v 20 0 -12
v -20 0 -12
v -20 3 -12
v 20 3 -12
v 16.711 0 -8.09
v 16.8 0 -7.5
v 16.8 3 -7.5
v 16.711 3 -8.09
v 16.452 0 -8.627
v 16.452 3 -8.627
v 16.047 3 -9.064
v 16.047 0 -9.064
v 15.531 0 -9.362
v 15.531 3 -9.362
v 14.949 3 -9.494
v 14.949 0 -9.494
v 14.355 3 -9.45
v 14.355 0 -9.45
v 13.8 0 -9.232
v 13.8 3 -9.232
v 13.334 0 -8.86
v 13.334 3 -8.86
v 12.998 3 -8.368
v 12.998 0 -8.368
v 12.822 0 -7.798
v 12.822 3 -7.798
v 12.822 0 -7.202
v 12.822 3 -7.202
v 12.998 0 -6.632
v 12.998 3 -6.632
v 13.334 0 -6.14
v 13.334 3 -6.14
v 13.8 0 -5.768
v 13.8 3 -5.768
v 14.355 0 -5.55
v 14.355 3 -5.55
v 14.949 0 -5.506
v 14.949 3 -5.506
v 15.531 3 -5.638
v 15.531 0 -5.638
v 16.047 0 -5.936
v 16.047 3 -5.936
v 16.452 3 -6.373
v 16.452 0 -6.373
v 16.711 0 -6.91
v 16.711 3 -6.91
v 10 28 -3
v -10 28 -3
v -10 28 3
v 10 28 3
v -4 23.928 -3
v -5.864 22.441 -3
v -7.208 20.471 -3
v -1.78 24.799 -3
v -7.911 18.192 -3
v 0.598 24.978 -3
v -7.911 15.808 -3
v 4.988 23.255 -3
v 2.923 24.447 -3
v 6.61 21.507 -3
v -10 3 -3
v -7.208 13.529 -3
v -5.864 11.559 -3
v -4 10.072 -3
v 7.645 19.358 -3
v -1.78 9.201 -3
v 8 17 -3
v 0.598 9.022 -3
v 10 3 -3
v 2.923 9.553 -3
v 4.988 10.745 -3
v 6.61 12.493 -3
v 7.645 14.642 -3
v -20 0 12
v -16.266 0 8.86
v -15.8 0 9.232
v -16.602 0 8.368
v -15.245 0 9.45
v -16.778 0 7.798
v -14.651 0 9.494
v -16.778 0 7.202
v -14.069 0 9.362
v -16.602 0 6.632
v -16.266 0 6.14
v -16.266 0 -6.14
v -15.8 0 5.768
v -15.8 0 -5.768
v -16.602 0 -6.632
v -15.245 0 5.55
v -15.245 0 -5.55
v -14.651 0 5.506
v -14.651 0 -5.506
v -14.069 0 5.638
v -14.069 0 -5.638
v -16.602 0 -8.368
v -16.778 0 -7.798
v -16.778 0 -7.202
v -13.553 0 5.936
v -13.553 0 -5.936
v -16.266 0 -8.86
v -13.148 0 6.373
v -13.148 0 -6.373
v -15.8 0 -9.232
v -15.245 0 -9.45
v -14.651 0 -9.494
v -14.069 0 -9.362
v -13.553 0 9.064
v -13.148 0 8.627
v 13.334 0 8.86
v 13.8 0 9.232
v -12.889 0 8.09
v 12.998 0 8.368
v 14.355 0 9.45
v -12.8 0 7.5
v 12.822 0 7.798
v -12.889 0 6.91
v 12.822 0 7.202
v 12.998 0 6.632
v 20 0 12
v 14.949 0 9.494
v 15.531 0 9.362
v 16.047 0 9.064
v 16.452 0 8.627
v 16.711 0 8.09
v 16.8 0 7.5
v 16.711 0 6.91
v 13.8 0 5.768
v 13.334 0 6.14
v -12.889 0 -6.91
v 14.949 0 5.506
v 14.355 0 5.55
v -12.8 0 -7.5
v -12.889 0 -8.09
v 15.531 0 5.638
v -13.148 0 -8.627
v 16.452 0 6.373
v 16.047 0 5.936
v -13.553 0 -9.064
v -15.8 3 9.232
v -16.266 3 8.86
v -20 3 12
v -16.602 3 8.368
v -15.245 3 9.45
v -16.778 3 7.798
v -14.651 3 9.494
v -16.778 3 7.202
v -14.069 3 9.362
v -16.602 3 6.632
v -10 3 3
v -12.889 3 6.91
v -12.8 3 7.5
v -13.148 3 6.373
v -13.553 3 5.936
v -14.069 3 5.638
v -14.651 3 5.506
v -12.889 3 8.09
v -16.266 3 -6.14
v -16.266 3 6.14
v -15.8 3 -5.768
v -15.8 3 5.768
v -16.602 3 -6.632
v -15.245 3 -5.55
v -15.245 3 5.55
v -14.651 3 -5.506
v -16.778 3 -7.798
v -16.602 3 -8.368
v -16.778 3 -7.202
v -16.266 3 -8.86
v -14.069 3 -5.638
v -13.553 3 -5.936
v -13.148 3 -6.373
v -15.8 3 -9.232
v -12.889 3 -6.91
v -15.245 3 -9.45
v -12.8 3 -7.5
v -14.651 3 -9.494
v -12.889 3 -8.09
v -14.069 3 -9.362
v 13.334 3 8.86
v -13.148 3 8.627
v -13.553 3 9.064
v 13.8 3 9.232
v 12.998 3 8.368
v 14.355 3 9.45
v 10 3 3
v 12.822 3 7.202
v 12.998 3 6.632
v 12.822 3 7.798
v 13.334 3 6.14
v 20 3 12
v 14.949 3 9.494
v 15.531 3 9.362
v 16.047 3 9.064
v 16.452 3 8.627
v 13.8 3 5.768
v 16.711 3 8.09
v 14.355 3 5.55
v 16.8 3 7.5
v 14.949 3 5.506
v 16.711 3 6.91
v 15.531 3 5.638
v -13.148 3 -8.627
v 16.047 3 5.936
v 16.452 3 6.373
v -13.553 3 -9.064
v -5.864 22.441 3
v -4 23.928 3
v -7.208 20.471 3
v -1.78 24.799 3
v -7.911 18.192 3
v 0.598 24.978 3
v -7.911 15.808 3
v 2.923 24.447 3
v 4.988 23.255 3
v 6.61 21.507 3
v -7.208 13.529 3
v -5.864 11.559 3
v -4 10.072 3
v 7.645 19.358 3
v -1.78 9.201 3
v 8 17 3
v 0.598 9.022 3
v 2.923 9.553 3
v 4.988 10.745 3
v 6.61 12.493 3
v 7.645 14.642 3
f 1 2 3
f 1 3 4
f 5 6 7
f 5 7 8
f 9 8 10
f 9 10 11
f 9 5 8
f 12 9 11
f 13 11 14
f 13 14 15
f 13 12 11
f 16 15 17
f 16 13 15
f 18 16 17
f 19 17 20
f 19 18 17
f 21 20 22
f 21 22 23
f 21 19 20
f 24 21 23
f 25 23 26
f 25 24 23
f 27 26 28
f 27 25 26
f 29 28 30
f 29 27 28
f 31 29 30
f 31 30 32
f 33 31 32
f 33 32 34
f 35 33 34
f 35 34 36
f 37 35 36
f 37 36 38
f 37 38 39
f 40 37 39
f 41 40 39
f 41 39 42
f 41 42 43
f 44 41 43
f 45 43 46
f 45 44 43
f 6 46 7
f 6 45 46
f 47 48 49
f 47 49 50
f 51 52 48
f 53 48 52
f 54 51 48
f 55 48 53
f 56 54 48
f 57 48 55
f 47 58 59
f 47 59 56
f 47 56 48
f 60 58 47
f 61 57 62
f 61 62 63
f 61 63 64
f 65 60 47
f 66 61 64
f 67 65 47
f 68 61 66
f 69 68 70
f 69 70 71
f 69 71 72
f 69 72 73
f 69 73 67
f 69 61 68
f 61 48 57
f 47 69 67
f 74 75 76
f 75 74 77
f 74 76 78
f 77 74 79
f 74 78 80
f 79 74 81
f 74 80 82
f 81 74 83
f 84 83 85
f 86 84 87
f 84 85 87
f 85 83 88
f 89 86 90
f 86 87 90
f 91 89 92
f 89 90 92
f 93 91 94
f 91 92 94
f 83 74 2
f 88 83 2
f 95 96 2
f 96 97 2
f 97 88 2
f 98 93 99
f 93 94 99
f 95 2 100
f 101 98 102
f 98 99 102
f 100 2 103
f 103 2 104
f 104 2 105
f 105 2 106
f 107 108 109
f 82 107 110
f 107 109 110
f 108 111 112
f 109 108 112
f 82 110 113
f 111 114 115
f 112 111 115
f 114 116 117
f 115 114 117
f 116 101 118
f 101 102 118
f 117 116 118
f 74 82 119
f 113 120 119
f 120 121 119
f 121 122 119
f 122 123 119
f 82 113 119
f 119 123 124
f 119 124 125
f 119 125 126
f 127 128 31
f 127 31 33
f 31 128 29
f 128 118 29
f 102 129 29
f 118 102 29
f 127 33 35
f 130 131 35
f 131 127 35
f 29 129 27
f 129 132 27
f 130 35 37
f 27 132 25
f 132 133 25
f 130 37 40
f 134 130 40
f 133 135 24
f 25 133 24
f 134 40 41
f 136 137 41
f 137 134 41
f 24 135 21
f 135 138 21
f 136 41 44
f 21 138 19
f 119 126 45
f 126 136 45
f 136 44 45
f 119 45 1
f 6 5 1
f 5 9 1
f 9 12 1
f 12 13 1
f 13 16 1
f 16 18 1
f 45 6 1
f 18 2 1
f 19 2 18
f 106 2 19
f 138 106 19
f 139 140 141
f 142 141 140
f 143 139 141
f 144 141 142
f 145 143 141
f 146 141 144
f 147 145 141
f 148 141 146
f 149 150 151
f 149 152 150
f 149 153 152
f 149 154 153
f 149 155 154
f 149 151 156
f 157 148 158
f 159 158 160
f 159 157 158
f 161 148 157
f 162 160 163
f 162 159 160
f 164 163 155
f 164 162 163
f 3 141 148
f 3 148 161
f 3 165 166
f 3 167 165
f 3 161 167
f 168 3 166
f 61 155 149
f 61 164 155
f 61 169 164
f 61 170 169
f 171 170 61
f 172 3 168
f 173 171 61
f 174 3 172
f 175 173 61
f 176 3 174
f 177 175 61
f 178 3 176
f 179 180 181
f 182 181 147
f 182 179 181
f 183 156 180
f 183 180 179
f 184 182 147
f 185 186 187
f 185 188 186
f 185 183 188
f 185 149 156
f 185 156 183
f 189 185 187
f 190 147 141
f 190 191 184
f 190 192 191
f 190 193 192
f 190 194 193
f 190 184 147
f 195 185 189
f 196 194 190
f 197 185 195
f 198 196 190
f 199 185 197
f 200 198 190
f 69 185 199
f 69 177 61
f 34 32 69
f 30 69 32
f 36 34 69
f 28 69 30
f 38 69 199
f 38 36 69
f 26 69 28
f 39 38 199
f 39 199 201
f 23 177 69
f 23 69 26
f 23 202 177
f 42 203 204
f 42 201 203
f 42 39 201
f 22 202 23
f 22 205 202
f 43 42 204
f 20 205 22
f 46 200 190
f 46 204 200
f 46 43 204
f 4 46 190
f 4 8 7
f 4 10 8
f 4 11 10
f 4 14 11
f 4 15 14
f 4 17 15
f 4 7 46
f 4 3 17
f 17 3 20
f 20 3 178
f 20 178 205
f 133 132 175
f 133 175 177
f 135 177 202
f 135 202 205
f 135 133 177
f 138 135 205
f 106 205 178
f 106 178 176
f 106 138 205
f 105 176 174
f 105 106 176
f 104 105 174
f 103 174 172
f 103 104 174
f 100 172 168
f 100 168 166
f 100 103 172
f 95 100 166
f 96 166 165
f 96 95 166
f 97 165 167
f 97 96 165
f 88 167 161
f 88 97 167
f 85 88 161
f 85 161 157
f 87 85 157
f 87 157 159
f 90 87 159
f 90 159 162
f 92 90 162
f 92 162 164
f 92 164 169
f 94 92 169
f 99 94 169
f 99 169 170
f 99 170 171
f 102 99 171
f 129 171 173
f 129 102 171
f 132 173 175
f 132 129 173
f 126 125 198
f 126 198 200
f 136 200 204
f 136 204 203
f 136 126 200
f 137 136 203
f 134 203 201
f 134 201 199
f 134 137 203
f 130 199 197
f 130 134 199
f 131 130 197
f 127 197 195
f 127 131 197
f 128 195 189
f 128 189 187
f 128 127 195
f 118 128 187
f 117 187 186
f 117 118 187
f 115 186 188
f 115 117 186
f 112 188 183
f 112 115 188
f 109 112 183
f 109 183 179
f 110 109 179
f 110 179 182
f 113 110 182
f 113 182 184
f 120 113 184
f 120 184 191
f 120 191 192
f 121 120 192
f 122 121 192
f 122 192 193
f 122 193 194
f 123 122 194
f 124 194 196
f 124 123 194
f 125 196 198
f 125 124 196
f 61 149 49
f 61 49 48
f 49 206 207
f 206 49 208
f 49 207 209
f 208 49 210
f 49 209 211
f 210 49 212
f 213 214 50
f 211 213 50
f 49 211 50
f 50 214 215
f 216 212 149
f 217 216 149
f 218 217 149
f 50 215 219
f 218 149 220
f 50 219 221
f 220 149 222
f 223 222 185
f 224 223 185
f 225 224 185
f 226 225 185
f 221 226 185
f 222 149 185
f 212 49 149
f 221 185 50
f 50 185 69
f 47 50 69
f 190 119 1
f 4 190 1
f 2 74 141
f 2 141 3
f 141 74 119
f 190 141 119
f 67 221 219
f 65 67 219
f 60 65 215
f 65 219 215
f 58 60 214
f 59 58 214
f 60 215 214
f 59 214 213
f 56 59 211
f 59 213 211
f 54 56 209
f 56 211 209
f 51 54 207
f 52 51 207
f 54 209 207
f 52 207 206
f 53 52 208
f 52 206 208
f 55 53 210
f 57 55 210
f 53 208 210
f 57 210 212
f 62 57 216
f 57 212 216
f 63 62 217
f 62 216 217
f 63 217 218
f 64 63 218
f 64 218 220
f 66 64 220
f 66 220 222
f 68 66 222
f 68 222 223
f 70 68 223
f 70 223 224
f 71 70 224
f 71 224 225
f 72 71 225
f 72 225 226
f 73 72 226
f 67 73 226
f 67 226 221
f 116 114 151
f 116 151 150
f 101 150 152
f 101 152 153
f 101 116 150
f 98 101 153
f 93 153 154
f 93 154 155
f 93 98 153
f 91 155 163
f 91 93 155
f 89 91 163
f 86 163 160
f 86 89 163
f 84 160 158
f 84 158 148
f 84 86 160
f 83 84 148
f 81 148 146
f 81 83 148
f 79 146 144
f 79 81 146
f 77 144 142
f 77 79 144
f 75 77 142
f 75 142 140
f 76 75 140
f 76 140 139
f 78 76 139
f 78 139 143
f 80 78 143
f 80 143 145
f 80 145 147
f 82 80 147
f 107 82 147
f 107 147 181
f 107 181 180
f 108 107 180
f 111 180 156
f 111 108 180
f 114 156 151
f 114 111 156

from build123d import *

# Parameters (mm, degrees)
SKETCH_1_W          = 40
SKETCH_1_H          = 24
SKETCH_1_R          = 2
EXTRUDE_1_DEPTH     = 3
SKETCH_2_W          = 20
SKETCH_2_H          = 6
EXTRUDE_2_DEPTH     = 25
SKETCH_3_R          = 8
CUT_EXTRUDE_1_DEPTH = 10


with BuildPart() as part:
    # 草图1 → 凸台-拉伸1 (new body)
    with BuildSketch(Plane(origin=(0, 0, 0), x_dir=(1, 0, 0), z_dir=(0, 1, 0))):
        Rectangle(SKETCH_1_W, SKETCH_1_H)
        with Locations((-14.8, -7.5)):
            Circle(SKETCH_1_R, mode=Mode.SUBTRACT)
        with Locations((14.8, -7.5)):
            Circle(SKETCH_1_R, mode=Mode.SUBTRACT)
        with Locations((-14.8, 7.5)):
            Circle(SKETCH_1_R, mode=Mode.SUBTRACT)
        with Locations((14.8, 7.5)):
            Circle(SKETCH_1_R, mode=Mode.SUBTRACT)
    extrude(amount=EXTRUDE_1_DEPTH)

    # 草图2 → 凸台-拉伸2 (add)
    with BuildSketch(Plane(origin=(0, 3, 0), x_dir=(1, 0, 0), z_dir=(0, 1, 0))):
        Rectangle(SKETCH_2_W, SKETCH_2_H)
    extrude(amount=EXTRUDE_2_DEPTH)

    # 草图3 → 切除-拉伸1 (cut)
    with BuildSketch(Plane.XY.offset(3)):
        with Locations((0, 17)):
            Circle(SKETCH_3_R)
    extrude(amount=-CUT_EXTRUDE_1_DEPTH, mode=Mode.SUBTRACT)


solid = part.part
